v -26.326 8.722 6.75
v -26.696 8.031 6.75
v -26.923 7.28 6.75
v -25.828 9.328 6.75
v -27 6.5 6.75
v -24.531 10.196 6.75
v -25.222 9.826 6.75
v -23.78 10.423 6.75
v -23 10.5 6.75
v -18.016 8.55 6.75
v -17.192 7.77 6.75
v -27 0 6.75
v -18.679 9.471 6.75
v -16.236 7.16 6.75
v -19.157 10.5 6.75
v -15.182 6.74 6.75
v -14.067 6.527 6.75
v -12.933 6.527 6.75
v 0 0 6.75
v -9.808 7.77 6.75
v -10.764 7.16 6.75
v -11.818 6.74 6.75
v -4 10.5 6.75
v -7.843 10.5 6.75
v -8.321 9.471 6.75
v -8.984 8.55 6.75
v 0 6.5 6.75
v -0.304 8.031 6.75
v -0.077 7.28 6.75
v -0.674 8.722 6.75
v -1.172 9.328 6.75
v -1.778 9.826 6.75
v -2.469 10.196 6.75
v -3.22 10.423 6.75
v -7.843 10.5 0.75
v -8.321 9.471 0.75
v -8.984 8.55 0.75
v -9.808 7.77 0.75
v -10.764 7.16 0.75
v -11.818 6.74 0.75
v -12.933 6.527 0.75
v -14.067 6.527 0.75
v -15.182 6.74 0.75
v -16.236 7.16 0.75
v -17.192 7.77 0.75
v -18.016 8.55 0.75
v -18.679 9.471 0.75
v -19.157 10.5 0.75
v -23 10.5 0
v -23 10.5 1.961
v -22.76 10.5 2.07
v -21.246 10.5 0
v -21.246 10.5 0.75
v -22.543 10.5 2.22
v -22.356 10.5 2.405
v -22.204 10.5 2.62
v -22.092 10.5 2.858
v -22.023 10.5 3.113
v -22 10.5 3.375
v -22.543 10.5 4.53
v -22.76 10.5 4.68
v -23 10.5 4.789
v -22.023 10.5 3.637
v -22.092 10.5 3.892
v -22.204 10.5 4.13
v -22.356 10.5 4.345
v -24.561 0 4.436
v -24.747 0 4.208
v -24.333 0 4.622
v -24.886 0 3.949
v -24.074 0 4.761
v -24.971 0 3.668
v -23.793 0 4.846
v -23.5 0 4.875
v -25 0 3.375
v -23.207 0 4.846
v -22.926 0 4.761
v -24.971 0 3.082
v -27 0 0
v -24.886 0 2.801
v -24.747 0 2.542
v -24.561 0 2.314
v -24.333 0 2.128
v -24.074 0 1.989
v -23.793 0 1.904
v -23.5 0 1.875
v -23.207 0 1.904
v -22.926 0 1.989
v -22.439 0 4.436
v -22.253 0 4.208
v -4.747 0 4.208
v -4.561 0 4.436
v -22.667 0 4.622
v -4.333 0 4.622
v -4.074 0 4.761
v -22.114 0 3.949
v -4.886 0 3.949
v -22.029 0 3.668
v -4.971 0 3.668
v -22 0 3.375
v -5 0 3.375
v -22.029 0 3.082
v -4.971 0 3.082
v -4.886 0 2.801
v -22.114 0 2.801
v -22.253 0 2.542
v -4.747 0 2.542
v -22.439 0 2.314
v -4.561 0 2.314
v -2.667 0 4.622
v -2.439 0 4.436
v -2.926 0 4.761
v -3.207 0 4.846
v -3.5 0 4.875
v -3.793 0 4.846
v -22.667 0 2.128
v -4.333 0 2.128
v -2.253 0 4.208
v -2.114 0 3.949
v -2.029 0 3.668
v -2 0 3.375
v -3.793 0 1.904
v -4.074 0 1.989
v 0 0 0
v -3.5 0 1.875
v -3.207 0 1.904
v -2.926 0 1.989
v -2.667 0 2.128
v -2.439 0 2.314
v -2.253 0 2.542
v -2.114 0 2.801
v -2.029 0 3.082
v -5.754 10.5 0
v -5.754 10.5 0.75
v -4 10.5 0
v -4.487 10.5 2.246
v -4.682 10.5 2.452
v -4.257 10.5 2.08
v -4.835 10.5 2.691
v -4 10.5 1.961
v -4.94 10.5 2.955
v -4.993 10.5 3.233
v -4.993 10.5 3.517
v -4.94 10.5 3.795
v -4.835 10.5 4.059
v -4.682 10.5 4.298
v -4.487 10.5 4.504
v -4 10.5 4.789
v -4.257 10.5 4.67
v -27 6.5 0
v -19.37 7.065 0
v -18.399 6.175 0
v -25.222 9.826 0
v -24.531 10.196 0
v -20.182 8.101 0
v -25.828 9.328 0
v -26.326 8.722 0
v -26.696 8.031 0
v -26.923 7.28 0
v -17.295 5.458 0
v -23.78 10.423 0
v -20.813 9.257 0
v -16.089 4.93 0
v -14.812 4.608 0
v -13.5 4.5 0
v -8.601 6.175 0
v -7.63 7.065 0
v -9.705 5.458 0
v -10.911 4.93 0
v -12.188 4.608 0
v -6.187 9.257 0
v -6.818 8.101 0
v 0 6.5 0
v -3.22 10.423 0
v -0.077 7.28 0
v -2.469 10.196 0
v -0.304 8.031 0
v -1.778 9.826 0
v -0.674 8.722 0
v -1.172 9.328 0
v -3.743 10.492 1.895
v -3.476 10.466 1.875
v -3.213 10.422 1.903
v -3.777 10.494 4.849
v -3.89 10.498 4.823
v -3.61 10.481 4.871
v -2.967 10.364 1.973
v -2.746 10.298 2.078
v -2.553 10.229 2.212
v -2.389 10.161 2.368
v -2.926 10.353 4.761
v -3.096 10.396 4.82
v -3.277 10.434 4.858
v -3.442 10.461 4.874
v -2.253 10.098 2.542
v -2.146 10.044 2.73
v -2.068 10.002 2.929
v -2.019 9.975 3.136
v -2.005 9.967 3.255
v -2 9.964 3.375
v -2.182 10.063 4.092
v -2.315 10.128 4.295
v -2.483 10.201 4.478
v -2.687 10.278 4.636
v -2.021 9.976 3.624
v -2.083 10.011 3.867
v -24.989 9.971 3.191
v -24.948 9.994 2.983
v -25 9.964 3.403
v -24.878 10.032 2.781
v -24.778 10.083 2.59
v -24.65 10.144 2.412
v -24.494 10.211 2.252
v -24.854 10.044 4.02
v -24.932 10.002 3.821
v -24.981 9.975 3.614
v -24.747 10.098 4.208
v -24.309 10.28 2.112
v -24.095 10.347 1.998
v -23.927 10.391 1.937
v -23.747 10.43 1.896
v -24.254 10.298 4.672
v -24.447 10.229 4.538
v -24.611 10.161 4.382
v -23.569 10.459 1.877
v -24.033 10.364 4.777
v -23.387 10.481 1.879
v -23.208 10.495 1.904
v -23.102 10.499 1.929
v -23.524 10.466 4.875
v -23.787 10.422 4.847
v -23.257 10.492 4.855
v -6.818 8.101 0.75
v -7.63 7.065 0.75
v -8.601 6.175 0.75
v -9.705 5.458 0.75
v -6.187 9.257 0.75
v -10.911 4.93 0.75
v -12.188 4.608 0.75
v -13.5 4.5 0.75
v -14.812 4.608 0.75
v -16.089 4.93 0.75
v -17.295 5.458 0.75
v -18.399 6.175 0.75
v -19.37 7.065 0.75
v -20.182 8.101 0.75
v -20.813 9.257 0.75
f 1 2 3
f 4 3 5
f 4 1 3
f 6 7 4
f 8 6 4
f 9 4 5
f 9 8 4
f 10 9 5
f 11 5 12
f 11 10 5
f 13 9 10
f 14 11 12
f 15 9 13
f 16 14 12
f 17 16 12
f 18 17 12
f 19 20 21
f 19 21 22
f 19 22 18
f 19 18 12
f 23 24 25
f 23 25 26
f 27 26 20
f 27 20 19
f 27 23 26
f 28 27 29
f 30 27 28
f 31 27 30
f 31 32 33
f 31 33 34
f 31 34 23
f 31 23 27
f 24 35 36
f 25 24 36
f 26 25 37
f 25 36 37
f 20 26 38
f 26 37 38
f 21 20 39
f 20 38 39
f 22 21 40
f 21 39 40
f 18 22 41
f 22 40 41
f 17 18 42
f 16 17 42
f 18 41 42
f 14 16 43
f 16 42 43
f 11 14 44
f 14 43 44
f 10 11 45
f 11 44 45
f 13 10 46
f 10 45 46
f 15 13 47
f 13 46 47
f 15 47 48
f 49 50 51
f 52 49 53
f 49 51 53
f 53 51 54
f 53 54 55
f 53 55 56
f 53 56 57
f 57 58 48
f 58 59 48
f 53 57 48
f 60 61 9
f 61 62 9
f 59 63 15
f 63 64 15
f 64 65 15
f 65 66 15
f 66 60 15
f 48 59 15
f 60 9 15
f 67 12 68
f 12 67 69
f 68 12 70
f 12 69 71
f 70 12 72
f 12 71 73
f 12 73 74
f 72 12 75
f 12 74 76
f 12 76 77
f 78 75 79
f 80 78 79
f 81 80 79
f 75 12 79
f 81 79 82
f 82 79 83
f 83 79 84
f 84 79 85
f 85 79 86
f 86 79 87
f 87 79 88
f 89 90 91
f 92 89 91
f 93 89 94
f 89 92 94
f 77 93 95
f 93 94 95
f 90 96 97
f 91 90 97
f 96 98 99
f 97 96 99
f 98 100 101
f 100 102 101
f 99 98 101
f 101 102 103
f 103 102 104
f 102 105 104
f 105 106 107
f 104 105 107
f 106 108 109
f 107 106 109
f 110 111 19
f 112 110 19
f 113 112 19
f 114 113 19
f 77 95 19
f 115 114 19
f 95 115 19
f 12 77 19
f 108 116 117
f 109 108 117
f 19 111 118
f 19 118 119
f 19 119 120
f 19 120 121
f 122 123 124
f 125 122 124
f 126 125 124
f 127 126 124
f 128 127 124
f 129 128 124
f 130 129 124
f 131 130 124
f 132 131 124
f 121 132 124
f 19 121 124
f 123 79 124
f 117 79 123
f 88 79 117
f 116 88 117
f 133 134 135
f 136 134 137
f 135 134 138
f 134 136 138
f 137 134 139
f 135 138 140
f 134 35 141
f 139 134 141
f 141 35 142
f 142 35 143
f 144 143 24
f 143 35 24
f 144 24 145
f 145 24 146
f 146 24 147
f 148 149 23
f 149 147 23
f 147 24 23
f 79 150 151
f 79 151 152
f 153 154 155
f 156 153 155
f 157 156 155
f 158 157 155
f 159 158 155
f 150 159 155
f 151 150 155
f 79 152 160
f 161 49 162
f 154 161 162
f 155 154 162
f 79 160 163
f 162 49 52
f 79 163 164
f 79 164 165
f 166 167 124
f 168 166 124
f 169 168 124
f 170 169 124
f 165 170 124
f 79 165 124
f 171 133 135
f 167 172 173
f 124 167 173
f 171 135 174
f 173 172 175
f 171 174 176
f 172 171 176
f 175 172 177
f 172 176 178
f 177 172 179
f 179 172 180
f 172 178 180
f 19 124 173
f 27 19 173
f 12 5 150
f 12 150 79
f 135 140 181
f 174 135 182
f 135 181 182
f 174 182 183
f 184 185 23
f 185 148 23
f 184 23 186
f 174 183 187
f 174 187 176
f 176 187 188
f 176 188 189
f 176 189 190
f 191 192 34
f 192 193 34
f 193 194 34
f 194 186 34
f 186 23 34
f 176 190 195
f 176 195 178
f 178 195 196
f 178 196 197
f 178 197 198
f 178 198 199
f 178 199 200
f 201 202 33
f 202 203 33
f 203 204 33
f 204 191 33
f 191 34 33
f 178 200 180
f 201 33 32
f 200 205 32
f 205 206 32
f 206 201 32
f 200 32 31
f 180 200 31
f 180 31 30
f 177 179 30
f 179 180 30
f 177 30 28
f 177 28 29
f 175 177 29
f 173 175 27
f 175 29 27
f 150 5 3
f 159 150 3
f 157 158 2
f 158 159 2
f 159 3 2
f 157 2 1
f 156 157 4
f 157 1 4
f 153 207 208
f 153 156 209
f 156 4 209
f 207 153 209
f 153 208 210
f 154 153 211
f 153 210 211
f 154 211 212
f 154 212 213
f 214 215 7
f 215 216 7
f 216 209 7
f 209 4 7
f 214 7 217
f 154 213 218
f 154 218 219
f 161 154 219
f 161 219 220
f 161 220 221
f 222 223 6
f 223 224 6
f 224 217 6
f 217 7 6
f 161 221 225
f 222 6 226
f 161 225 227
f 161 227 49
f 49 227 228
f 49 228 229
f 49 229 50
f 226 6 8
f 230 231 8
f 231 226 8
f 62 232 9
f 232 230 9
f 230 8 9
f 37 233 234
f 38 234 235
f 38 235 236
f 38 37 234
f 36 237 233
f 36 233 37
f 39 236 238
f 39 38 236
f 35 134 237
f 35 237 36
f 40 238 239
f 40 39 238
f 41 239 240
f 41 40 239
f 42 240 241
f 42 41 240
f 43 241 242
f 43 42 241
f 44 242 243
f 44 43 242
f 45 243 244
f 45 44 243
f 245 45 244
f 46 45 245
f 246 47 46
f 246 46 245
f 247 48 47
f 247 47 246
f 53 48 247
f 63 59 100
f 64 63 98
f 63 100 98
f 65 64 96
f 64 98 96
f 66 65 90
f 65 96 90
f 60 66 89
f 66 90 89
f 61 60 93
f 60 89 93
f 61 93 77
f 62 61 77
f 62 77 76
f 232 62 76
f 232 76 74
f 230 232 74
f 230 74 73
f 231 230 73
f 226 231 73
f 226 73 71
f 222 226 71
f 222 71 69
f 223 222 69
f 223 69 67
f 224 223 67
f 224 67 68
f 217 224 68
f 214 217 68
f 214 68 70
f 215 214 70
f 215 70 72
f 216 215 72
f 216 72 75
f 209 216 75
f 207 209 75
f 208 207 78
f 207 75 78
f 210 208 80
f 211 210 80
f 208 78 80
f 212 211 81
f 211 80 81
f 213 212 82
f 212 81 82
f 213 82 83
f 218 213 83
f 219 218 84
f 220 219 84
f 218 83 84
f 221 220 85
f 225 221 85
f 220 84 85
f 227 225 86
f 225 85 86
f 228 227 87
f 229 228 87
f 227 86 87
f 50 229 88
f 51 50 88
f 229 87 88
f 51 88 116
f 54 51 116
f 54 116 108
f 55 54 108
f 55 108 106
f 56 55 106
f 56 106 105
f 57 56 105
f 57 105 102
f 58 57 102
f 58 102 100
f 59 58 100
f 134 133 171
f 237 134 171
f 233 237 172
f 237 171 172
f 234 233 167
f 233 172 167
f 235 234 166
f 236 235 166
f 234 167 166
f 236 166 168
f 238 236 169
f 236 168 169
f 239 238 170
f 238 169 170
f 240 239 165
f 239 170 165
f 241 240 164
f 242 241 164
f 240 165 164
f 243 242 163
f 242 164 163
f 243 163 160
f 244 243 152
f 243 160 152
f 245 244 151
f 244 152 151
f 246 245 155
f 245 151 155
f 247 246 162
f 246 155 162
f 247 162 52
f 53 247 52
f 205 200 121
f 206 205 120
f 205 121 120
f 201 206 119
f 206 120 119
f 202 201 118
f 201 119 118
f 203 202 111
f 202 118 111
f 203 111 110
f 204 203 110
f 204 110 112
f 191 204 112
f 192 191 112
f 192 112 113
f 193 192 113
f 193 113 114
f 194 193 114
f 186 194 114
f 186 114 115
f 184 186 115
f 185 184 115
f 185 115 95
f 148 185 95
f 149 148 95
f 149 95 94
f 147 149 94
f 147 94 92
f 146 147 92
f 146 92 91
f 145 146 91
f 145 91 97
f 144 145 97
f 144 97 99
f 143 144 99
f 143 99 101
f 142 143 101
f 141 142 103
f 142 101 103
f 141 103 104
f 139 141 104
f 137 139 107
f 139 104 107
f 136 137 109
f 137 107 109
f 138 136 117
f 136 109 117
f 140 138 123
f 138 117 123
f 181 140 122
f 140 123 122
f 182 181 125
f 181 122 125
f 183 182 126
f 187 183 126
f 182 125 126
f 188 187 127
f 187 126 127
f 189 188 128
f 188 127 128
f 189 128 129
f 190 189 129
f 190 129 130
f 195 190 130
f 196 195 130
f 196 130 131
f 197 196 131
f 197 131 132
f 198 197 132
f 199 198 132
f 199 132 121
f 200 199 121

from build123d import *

# Parameters (mm, degrees)
BOSS_EXTRUDE1_DEPTH = 6.75
SKETCH3_R           = 8
CUT_EXTRUDE2_DEPTH  = 0.75
SKETCH4_W           = 27
SKETCH4_H           = 2
CUT_EXTRUDE3_DEPTH  = 9
SKETCH5_R           = 1.5
CUT_EXTRUDE4_DEPTH  = 16
FILLET1_R           = 4


with BuildPart() as part:
    # Sketch1 → Boss-Extrude1 (new body)
    with BuildSketch(Plane.XY):
        with BuildLine():
            Line((-27, 0), (0, 0))
            Line((0, 0), (0, 12.5))
            Line((0, 12.5), (-7.5, 12.5))
            ThreePointArc((-7.5, 12.5), (-13.5, 6.5), (-19.5, 12.5))
            Line((-19.5, 12.5), (-27, 12.5))
            Line((-27, 12.5), (-27, 0))
        make_face()
    extrude(amount=BOSS_EXTRUDE1_DEPTH)

    # Sketch3 → Cut-Extrude2 (cut)
    with BuildSketch(Plane(origin=(0, 0, 0), x_dir=(-1, 0, 0), z_dir=(0, 0, -1))):
        with Locations((13.5, 12.5)):
            Circle(SKETCH3_R)
    extrude(amount=-CUT_EXTRUDE2_DEPTH, mode=Mode.SUBTRACT)

    # Sketch4 → Cut-Extrude3 (cut)
    with BuildSketch(Plane.XY.offset(6.75)):
        with Locations((-13.5, 11.5)):
            Rectangle(SKETCH4_W, SKETCH4_H)
    extrude(amount=-CUT_EXTRUDE3_DEPTH, mode=Mode.SUBTRACT)

    # Sketch5 → Cut-Extrude4 (cut)
    with BuildSketch(Plane.XZ):
        with Locations((-23.5, 3.375)):
            Circle(SKETCH5_R)
        with Locations((-3.5, 3.375)):
            Circle(SKETCH5_R)
    extrude(amount=-CUT_EXTRUDE4_DEPTH, mode=Mode.SUBTRACT)

    # Fillet1
    # the kernel refuses this fillet: 4 mm, written as the material it takes off along each edge
    with BuildSketch(Plane(origin=(-27, 10.5, 16.75), x_dir=(1, 0, 0), z_dir=(0, 0, -1))) as fillet1_piece_1:
        with BuildLine():
            CenterArc((FILLET1_R, FILLET1_R), FILLET1_R, 180, 90)
            Line((0, FILLET1_R), (0, 0))
            Line((0, 0), (FILLET1_R, 0))
        make_face()
    extrude(amount=26.75, mode=Mode.SUBTRACT)
    with BuildSketch(Plane(origin=(0, 10.5, 16.75), x_dir=(-1, 0, 0), z_dir=(0, 0, -1))) as fillet1_piece_2:
        with BuildLine():
            CenterArc((FILLET1_R, -FILLET1_R), FILLET1_R, 90, 90)
            Line((0, -FILLET1_R), (0, 0))
            Line((0, 0), (FILLET1_R, 0))
        make_face()
    extrude(amount=26.75, mode=Mode.SUBTRACT)


solid = part.part
